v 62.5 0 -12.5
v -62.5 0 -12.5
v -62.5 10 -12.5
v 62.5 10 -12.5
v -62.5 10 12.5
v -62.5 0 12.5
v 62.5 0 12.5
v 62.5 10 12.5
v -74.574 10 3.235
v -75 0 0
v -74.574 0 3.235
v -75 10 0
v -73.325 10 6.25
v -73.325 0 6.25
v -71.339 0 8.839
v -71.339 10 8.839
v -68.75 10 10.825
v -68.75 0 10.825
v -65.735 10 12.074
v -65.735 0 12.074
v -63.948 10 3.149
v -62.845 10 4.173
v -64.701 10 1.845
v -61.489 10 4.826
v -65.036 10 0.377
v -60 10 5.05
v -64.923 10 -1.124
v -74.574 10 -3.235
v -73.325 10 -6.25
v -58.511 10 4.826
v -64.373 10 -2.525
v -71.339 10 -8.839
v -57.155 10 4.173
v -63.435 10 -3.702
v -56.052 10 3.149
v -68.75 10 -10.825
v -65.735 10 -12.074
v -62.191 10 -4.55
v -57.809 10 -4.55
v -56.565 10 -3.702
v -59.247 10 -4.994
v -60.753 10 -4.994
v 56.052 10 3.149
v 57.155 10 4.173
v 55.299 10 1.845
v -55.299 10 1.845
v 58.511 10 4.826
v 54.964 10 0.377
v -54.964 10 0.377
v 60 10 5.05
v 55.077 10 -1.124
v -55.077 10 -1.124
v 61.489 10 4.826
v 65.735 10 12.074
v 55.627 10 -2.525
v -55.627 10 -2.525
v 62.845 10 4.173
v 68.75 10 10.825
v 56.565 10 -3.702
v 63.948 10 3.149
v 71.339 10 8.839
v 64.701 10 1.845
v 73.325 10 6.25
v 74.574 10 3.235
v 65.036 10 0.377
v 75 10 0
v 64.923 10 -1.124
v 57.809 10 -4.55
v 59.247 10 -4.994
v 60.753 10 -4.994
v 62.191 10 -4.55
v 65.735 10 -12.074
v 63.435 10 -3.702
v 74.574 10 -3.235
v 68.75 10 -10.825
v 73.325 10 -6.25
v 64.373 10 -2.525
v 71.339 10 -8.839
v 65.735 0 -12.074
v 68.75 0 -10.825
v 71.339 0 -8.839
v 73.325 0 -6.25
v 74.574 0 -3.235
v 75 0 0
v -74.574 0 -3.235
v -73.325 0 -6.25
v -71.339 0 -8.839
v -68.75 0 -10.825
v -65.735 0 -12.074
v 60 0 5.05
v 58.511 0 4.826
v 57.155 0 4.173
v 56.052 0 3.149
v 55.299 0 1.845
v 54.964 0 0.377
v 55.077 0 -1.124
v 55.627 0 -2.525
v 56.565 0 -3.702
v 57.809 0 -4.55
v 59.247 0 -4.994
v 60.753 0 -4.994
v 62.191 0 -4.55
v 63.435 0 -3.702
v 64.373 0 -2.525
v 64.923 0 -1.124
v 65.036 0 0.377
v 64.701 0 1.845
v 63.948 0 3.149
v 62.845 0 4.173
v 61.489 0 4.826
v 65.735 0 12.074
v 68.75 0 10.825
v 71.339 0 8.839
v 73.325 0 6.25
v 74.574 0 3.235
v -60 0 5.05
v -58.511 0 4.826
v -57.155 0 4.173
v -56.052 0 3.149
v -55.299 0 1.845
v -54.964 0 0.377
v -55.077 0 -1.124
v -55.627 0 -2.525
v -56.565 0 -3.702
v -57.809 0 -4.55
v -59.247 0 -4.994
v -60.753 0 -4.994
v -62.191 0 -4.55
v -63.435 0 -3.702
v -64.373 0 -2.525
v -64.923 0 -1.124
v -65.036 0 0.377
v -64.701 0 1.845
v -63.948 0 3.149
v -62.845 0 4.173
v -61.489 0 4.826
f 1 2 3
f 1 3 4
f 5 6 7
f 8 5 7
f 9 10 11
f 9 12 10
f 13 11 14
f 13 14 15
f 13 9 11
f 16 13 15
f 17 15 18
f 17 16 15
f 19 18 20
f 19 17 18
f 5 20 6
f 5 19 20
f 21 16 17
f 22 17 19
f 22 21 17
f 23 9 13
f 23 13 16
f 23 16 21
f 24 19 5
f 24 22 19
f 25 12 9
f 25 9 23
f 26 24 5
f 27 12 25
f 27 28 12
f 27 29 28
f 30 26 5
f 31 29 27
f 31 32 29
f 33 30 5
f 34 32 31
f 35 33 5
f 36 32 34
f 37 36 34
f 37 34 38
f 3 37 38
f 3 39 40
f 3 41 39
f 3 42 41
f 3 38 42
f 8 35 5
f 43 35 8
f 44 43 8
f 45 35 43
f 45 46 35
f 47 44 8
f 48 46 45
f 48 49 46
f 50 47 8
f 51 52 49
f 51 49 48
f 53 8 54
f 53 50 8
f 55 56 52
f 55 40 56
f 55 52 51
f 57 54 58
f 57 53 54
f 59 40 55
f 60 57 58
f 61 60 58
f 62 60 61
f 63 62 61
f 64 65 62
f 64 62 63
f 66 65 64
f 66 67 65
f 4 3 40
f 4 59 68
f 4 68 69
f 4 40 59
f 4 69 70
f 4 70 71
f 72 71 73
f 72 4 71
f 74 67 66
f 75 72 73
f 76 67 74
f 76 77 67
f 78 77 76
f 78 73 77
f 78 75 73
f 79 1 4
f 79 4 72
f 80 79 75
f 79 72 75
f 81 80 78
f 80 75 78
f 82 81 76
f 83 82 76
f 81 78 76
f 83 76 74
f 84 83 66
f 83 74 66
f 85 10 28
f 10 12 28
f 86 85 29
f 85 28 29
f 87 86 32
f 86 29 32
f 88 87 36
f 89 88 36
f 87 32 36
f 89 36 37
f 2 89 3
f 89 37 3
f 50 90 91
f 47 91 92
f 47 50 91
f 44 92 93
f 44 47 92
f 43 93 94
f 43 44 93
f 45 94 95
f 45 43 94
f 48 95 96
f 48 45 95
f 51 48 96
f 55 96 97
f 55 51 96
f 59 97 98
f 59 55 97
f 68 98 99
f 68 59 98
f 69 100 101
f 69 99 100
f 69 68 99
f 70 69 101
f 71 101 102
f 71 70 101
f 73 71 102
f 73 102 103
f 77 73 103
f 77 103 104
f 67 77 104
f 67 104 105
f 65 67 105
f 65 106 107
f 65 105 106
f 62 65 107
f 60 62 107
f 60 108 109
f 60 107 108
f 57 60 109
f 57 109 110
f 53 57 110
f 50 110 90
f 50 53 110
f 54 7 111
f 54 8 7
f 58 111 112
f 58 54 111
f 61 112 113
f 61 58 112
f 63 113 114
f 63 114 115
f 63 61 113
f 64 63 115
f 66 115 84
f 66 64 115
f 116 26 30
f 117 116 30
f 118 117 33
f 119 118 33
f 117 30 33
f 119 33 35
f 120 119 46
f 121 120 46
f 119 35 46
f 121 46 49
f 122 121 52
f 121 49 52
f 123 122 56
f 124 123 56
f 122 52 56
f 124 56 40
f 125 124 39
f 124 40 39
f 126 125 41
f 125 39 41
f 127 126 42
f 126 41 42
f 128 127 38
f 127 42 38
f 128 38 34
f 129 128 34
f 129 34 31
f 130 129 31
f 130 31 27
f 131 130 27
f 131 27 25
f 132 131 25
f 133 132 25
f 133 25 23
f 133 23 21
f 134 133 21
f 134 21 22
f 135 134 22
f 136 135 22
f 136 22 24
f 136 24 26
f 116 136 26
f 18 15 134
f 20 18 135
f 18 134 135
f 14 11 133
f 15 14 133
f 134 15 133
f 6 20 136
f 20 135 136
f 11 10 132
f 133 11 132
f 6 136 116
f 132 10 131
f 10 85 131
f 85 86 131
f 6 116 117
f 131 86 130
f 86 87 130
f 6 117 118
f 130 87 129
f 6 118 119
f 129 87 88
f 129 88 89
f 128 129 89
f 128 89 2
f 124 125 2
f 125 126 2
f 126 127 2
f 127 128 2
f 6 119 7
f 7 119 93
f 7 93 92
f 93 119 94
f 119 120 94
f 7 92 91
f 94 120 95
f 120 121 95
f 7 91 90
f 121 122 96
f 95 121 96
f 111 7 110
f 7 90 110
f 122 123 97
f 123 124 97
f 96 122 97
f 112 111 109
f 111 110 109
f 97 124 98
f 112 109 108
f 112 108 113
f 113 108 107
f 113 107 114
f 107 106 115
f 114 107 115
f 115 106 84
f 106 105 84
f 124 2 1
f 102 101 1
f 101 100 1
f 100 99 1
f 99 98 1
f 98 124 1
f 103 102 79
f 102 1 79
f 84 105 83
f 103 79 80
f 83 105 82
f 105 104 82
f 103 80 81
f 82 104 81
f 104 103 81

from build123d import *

# Parameters (mm, degrees)
SKETCH_1_W          = 150
SKETCH_1_H          = 25
EXTRUDE_2_DEPTH     = 10
SKETCH_5_R          = 5.05
CUT_EXTRUDE_4_DEPTH = 77.689308251
FILLET_1_R          = 12.5


with BuildPart() as part:
    # Эскиз1 → Бобышка-Вытянуть2 (new body)
    with BuildSketch(Plane(origin=(0, 0, 0), x_dir=(1, 0, 0), z_dir=(0, 1, 0))):
        Rectangle(SKETCH_1_W, SKETCH_1_H)
    extrude(amount=EXTRUDE_2_DEPTH)

    # Эскиз5 → Вырез-Вытянуть4 (cut, through all)
    with BuildSketch(Plane(origin=(0, 10, 0), x_dir=(1, 0, 0), z_dir=(0, 1, 0))):
        with Locations(Location((-60, 0, 0), (0, 0, 270))):
            Circle(SKETCH_5_R)
    cut_extrude_4 = extrude(amount=-CUT_EXTRUDE_4_DEPTH, mode=Mode.SUBTRACT)

    # Зеркальное отражение1: Вырез-Вытянуть4 across plane
    add(cut_extrude_4.mirror(Plane(origin=(0, 0, 0), x_dir=(0, 0, 1), z_dir=(1, 0, 0))), mode=Mode.SUBTRACT)

    # Скругление1
    fillet_1_edges = [part.edges().sort_by_distance(p)[0] for p in [
        (-75, 5, 12.5),
        (-75, 5, -12.5),
        (75, 5, 12.5),
        (75, 5, -12.5),
    ]]
    fillet(fillet_1_edges, radius=FILLET_1_R - 0.0001)  # a hair under: the kernel refuses the full size


solid = part.part
